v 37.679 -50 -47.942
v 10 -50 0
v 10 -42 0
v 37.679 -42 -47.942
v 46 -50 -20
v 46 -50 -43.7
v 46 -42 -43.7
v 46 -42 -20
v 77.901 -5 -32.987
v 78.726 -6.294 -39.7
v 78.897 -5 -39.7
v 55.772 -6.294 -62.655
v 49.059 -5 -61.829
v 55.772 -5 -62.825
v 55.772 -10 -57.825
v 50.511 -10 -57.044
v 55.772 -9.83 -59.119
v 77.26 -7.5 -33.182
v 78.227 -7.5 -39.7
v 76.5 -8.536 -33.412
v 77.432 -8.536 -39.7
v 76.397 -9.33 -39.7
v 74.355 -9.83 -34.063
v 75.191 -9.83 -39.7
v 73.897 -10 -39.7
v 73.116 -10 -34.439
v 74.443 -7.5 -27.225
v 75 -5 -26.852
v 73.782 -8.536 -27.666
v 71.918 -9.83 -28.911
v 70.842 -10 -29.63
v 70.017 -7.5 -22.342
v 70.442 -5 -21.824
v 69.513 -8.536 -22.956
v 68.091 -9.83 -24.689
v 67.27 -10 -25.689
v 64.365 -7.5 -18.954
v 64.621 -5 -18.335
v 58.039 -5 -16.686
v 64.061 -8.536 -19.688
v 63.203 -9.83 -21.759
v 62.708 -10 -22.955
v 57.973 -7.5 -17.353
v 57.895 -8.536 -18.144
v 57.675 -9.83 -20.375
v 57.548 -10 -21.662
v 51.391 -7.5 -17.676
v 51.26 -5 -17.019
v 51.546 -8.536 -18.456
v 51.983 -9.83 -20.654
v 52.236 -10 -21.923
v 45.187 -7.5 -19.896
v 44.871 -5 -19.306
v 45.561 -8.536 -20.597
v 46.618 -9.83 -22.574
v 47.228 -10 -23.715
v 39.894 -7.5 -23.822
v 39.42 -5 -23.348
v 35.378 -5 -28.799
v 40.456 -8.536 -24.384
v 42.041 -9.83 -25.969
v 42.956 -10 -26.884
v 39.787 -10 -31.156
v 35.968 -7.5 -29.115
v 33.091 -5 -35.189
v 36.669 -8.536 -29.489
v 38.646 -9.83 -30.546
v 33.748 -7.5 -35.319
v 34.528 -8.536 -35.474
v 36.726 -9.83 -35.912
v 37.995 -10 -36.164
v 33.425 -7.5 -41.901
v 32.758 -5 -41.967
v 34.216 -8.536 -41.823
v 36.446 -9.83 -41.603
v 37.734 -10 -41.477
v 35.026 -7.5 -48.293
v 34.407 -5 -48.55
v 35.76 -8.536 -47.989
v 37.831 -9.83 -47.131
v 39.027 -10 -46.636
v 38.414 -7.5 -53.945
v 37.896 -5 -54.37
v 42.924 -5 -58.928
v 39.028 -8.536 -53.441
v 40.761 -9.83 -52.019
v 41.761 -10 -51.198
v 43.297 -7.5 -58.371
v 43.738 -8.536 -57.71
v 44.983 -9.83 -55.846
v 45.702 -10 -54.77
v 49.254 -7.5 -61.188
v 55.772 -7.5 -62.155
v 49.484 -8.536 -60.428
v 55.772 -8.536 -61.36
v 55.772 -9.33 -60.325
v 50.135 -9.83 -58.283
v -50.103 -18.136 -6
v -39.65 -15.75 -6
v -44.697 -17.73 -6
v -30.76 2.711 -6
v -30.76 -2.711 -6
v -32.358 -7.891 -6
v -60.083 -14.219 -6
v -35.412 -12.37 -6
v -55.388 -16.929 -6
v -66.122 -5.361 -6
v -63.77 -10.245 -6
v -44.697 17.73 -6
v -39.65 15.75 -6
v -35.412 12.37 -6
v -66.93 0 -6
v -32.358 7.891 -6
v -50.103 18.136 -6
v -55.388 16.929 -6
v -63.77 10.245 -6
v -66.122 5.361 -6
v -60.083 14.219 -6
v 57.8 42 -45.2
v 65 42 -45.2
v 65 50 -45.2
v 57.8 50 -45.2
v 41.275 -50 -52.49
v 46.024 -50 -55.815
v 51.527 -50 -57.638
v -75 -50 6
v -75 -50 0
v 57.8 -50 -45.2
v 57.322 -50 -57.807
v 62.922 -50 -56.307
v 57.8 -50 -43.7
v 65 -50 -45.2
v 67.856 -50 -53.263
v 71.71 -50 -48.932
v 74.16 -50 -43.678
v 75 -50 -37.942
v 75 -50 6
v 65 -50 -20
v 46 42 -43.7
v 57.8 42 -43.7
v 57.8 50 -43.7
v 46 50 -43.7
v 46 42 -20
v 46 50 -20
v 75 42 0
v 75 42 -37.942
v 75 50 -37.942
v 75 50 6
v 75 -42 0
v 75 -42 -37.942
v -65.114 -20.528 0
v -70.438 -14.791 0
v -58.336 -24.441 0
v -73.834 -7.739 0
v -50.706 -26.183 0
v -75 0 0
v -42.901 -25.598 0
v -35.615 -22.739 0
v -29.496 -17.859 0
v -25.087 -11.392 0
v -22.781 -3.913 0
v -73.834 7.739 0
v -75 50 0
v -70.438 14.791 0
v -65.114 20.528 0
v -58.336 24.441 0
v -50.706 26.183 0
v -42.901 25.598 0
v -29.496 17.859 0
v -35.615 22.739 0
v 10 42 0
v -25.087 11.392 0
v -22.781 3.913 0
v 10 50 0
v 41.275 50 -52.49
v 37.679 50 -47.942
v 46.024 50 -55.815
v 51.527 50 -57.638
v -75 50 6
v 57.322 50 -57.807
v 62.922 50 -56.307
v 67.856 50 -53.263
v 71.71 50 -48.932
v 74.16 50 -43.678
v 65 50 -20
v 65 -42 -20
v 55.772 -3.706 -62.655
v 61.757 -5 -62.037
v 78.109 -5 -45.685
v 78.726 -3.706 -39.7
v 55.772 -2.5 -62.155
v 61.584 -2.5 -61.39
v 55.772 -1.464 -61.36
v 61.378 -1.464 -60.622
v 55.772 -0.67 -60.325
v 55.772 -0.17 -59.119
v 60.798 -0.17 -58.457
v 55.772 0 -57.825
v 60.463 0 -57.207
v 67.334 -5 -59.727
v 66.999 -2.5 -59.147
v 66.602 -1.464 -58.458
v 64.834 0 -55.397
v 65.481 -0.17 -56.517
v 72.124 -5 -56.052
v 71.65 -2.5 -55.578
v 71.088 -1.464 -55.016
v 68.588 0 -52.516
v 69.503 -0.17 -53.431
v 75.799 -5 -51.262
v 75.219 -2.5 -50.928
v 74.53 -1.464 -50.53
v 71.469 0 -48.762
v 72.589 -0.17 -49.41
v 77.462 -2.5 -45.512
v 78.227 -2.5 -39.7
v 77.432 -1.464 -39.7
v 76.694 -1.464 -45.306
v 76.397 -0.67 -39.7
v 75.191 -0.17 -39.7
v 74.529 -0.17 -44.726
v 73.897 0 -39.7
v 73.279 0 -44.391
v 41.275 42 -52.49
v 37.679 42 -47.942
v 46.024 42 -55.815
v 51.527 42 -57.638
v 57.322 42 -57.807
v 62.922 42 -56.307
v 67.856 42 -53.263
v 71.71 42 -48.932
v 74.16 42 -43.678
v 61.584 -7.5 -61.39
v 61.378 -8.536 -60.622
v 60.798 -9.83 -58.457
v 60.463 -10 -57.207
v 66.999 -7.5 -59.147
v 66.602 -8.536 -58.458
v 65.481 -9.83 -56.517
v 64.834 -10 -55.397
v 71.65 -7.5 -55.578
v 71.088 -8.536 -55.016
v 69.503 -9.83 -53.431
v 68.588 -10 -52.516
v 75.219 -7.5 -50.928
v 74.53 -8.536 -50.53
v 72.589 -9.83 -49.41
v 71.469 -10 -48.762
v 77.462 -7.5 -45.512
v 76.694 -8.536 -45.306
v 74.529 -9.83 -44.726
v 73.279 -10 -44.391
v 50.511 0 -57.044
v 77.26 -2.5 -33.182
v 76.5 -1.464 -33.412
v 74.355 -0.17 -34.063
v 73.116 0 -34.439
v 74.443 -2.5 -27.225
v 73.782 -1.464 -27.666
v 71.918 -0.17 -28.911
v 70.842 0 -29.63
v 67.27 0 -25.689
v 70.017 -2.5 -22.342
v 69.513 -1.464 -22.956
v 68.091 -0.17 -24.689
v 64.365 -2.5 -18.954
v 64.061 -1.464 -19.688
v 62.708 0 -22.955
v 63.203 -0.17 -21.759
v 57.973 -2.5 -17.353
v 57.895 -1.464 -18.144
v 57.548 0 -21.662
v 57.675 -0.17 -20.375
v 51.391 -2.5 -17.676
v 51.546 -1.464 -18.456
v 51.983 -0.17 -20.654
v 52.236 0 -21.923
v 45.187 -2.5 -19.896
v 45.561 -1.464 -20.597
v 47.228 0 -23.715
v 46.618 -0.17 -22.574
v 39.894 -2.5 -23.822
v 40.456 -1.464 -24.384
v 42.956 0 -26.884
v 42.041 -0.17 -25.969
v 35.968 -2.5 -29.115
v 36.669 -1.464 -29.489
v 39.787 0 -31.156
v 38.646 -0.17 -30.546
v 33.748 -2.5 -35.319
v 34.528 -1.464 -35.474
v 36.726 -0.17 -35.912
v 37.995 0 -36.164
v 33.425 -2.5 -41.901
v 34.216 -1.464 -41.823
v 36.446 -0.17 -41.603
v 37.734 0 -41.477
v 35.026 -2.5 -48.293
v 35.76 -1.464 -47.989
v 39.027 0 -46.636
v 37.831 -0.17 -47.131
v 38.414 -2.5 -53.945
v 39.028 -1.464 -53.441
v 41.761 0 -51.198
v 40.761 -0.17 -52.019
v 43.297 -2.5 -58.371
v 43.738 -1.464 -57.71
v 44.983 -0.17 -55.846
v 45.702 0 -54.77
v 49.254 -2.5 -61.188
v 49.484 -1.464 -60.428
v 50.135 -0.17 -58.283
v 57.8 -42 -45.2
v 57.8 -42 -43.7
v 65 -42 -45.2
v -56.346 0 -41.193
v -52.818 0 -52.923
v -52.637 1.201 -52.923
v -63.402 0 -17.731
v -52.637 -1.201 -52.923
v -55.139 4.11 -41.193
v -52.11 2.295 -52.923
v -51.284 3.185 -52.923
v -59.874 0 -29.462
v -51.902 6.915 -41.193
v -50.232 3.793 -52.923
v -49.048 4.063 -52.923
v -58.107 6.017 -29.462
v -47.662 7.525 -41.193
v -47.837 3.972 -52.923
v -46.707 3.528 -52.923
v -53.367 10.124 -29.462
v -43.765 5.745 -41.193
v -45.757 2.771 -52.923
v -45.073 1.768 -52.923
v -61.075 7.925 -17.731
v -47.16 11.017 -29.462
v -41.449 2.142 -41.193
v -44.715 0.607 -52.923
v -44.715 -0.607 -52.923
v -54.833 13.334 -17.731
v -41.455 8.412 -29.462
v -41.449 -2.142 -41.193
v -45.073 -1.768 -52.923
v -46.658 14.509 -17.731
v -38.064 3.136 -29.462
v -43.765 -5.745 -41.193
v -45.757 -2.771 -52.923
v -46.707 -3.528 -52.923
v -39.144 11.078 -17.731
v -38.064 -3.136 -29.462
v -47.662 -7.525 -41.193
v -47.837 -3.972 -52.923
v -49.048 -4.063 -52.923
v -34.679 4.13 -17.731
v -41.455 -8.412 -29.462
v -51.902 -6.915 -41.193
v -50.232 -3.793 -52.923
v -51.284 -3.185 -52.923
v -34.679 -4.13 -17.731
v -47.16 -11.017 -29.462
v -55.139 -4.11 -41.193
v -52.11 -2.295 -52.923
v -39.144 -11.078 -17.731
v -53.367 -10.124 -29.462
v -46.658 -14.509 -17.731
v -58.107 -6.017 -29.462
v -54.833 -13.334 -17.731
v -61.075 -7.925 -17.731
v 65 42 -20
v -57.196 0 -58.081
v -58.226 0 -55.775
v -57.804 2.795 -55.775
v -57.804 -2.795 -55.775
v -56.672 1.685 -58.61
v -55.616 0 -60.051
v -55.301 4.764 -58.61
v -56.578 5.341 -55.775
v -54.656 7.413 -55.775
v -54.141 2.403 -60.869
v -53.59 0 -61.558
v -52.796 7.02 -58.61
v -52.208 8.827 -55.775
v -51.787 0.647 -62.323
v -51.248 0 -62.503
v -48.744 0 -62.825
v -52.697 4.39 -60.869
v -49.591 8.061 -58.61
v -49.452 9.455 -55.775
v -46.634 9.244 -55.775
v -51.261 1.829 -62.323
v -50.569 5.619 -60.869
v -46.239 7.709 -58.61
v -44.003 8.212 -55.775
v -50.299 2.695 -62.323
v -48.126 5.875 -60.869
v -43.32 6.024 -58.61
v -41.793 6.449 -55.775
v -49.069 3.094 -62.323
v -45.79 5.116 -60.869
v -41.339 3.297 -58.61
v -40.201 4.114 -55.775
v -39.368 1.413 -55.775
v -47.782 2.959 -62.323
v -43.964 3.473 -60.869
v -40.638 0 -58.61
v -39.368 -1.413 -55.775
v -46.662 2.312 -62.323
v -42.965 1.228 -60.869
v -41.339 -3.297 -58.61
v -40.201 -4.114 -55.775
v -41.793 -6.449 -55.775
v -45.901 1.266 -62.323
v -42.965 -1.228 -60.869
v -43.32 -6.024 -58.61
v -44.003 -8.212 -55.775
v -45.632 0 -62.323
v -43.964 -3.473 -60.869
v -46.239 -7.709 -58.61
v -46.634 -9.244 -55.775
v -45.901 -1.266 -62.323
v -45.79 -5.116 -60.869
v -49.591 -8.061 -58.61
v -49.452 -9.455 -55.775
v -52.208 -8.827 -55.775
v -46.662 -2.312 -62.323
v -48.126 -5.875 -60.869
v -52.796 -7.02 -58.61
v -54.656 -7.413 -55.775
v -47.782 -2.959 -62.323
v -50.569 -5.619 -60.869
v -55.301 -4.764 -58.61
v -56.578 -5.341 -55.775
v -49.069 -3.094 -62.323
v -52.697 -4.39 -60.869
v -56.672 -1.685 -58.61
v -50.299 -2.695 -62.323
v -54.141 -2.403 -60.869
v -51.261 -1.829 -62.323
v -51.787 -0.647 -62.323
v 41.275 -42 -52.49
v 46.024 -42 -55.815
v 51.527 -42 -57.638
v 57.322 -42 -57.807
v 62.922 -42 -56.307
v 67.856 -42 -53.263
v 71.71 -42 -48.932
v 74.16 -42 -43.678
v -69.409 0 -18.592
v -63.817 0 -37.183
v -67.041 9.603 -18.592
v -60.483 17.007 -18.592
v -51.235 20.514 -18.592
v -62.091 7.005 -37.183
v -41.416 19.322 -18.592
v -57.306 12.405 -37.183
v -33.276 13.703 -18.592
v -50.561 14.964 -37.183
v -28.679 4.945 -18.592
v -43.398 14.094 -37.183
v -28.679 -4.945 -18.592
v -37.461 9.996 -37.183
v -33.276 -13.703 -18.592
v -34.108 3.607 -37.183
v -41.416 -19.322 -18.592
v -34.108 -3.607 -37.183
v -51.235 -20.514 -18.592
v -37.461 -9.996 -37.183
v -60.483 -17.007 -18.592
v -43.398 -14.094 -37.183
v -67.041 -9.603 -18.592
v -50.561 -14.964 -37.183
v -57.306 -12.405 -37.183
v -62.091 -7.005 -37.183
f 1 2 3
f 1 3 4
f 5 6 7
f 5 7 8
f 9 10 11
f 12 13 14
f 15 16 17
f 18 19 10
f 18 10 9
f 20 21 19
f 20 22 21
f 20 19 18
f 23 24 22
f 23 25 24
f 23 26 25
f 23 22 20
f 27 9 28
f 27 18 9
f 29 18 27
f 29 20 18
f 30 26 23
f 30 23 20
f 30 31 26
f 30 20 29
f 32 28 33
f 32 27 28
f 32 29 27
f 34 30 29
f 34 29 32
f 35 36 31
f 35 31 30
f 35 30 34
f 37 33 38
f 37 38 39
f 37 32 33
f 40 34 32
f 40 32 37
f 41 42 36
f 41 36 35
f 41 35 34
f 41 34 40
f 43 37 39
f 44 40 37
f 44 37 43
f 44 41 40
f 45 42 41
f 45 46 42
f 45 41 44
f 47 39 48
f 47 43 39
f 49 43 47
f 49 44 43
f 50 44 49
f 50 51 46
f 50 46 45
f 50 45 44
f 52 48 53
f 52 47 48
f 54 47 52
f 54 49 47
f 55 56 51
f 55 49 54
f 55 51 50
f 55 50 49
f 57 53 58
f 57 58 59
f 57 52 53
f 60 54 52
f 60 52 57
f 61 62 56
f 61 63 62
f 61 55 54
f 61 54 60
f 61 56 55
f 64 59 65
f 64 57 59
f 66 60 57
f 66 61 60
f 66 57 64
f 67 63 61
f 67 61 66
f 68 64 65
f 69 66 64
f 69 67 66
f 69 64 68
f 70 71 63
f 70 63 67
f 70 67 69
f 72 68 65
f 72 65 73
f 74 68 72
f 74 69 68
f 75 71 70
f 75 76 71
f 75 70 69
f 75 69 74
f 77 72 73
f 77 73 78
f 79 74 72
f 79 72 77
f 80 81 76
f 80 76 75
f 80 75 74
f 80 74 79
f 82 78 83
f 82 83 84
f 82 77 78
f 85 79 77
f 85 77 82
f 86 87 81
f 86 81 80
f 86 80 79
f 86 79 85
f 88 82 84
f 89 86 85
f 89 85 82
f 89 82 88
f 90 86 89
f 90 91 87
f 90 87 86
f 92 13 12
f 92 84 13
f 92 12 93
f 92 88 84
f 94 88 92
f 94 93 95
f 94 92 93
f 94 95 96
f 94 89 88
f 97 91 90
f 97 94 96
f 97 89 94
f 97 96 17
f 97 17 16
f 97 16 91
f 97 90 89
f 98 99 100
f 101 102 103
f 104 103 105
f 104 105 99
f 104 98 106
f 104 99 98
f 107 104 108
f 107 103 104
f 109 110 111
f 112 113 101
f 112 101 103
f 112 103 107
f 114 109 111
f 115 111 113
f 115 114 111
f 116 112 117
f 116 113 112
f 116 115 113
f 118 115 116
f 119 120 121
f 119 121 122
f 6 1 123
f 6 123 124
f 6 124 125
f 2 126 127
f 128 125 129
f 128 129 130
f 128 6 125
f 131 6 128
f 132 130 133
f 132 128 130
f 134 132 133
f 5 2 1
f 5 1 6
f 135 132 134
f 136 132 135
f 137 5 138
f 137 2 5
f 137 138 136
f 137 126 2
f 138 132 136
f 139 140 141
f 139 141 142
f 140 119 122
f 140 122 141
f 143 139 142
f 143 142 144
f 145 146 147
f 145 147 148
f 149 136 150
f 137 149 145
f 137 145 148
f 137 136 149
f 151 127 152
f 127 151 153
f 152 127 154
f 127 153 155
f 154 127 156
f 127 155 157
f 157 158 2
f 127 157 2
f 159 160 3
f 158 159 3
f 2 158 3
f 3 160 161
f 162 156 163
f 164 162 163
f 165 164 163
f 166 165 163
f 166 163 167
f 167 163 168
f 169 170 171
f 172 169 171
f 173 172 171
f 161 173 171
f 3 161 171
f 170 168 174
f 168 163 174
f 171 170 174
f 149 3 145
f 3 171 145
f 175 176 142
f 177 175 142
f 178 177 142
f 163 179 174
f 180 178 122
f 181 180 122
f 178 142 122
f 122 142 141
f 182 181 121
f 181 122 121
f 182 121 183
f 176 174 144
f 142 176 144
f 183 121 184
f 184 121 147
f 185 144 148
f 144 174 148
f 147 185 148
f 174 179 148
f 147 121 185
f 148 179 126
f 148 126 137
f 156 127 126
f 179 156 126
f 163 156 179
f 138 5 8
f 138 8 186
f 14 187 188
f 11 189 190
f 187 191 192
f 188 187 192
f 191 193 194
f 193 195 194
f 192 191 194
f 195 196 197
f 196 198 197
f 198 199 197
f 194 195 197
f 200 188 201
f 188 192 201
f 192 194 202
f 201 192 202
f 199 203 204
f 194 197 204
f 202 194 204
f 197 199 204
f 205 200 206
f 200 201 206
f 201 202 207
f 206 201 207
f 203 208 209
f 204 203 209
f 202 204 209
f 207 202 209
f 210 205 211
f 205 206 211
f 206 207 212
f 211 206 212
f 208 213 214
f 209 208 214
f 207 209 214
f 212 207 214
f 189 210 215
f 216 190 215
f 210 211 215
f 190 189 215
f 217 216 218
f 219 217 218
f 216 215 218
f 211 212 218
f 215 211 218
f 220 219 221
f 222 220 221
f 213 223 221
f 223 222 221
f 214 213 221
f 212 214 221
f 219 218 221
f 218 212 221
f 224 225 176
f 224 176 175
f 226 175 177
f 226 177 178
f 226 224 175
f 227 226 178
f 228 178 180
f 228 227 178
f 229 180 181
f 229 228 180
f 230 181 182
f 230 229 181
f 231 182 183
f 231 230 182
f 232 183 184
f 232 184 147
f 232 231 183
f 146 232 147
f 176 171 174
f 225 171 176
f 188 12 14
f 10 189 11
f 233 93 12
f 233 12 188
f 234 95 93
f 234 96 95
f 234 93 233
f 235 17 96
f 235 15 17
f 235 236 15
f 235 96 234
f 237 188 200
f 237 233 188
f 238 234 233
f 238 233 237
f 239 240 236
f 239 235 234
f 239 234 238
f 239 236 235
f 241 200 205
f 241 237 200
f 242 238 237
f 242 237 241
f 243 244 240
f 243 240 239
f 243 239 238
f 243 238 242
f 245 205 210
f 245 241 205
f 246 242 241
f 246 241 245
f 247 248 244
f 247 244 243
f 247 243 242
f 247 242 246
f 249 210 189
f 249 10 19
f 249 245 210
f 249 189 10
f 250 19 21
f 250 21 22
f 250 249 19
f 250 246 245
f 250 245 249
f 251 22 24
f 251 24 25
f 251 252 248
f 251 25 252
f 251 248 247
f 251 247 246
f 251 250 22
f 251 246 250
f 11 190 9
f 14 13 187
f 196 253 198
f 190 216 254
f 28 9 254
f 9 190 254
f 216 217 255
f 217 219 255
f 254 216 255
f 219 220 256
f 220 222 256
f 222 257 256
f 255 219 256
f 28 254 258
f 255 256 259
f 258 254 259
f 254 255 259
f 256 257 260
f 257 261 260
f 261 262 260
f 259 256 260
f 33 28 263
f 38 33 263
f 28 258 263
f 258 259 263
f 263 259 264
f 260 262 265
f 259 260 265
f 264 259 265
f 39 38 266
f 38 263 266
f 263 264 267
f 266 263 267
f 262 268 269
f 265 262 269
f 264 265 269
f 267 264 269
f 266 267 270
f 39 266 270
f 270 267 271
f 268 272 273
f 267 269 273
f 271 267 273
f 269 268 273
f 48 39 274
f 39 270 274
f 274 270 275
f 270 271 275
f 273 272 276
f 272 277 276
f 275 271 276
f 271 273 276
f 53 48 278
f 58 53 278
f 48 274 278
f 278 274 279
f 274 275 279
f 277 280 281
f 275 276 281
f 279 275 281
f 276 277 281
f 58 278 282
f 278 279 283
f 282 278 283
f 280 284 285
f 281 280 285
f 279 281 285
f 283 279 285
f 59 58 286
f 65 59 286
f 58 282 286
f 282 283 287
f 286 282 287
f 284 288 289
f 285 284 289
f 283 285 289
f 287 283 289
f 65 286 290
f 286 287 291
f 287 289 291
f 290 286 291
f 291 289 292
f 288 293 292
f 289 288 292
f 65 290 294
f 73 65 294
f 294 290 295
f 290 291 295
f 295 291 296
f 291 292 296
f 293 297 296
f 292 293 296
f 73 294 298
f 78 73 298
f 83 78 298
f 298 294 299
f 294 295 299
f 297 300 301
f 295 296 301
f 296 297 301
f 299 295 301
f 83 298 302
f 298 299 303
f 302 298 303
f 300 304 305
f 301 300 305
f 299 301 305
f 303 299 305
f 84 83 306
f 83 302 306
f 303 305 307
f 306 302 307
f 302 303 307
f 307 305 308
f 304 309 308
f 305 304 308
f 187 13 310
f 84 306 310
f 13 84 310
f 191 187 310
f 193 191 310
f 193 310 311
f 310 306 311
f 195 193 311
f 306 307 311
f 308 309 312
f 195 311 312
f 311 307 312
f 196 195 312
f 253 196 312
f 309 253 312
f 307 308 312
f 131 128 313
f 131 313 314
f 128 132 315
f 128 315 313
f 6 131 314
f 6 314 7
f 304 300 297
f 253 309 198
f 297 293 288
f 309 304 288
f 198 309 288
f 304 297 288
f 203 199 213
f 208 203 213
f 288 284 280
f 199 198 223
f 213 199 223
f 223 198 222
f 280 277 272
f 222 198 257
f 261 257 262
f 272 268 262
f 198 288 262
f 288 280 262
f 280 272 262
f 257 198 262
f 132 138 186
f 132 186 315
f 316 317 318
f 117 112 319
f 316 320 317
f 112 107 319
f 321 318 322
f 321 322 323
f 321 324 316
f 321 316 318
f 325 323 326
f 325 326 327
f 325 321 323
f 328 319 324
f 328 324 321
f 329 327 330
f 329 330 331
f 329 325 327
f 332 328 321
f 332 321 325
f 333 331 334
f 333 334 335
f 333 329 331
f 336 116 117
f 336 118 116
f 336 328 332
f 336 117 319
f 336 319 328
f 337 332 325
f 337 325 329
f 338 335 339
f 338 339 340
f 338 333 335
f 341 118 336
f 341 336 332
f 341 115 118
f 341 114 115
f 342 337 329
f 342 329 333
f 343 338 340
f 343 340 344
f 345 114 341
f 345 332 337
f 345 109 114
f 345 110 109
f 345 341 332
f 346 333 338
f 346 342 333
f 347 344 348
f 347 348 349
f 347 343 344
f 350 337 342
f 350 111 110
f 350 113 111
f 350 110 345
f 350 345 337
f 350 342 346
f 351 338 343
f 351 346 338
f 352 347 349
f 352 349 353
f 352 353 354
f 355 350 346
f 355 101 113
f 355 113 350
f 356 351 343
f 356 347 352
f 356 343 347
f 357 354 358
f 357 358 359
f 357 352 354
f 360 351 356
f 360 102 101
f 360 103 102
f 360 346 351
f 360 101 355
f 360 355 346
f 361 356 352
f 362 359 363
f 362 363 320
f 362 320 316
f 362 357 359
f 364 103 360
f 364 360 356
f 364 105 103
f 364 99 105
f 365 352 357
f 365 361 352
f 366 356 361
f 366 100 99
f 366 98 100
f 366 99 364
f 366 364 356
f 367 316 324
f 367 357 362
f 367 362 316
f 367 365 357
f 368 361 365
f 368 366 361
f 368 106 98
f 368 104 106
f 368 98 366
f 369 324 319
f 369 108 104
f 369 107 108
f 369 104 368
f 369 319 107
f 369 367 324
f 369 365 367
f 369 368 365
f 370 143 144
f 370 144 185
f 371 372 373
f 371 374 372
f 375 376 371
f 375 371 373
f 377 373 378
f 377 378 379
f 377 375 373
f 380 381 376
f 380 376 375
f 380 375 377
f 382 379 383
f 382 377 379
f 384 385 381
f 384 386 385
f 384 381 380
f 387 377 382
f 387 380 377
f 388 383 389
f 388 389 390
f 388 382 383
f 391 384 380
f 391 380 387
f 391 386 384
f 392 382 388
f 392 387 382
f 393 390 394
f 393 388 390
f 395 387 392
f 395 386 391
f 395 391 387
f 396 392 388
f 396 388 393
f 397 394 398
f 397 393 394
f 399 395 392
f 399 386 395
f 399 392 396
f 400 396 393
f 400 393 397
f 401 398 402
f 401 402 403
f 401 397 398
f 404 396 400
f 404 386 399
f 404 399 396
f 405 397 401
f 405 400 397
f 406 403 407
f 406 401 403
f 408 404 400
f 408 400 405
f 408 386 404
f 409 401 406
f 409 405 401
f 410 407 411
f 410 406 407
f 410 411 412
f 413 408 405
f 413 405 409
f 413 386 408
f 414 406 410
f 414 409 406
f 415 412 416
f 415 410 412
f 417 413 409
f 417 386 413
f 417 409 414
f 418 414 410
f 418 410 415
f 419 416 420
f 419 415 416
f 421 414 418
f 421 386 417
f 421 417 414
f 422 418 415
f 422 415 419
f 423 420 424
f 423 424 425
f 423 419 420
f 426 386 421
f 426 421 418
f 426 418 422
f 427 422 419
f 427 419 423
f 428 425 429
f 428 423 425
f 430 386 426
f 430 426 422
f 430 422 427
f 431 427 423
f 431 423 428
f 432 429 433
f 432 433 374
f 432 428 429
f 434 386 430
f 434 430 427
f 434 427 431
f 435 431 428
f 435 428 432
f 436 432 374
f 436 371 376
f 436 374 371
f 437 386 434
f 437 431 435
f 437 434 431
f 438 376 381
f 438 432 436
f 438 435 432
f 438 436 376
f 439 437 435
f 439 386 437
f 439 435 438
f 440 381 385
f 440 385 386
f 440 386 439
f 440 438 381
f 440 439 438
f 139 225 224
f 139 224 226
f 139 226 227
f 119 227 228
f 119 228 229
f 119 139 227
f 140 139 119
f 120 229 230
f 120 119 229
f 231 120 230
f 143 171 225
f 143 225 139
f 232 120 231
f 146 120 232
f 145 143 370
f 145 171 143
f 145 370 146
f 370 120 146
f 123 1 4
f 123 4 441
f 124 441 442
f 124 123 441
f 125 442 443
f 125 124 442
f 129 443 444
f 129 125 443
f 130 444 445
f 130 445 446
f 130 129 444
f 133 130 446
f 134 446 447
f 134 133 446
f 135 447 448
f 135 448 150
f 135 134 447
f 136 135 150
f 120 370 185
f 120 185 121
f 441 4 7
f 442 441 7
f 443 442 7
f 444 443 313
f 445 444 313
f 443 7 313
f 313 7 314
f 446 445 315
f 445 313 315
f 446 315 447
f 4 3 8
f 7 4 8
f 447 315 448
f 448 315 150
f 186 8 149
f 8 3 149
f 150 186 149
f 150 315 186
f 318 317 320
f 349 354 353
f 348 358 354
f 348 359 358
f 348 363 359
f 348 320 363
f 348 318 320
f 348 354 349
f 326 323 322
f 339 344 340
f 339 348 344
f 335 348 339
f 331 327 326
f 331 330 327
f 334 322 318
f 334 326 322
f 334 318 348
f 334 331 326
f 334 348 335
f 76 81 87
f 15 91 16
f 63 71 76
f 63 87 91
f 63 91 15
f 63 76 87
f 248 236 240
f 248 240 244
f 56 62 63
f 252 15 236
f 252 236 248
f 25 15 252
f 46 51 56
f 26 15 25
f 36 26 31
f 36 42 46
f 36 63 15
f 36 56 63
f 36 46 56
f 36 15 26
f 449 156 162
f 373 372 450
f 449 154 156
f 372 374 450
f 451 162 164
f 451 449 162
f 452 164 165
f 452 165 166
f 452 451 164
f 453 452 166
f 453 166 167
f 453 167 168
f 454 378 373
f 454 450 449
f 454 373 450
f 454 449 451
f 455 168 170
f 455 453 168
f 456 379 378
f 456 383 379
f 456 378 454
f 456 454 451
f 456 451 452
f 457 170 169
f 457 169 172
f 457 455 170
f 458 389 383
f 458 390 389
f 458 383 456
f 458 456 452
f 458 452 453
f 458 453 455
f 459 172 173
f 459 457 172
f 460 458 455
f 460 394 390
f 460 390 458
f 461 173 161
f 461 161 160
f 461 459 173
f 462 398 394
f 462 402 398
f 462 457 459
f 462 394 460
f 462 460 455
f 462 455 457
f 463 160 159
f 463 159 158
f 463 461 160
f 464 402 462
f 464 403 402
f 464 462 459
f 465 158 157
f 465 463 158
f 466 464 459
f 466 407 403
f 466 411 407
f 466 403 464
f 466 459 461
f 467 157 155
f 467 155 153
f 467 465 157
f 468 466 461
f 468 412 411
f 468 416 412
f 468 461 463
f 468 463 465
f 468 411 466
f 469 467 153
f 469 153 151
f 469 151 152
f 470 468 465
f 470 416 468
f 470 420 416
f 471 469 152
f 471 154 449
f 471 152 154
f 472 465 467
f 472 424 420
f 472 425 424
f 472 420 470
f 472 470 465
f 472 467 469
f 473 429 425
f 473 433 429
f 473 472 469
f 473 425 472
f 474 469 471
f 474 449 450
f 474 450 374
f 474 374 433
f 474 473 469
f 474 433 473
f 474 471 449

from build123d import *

# Parameters (mm, degrees)
F0_W     = 150
F0_H     = 100
F1_DEPTH = 6
F5_DEPTH = 100
F3_W     = 171.0709459866
F3_H     = 84
F6_DEPTH = 200
F8_DEPTH = 10
F9_R     = 4.99999


# Not quite as in the source:
# - a fillet or chamfer is up to 0.001 mm smaller than in the source, because OpenCascade refuses the exact size


with BuildPart() as f1:
    # F0 (on Top) → F1 (new body)
    with BuildSketch(Plane.XY):
        Rectangle(F0_W, F0_H)
    extrude(amount=F1_DEPTH)

    # F2 (on face) → F5 (join)
    with BuildSketch(Plane.XZ.offset(50)):
        with BuildLine():
            Line((75, 0), (10, 0))
            Line((10, 0), (37.6794919243, -47.9422863406))
            ThreePointArc((37.6794919243, -47.9422863406), (60.1763809021, -57.2608028664), (75, -37.9422863406))
            Line((75, -37.9422863406), (75, 0))
        make_face()
        Polygon((46, -20), (65, -20), (65, -45.2), (57.8, -45.2), (57.8, -43.7), (46, -43.7), align=None, mode=Mode.SUBTRACT)
    extrude(amount=-F5_DEPTH)

    # F3 (on Top) → F6 (cut)
    with BuildSketch(Plane.XY):
        with Locations((25.0738235191, 0)):
            Rectangle(F3_W, F3_H)
    extrude(amount=-F6_DEPTH, mode=Mode.SUBTRACT)

    # F4 (on Front) → F7 (revolve)
    with BuildSketch(Plane.XZ):
        with BuildLine():
            Line((-48.7436212599, 0), (-75, 0))
            Line((-75, 0), (-58.2256204143, -55.7750751688))
            ThreePointArc((-58.2256204143, -55.7750751688), (-58.2296045097, -50.0849254651), (-55.1008508317, -45.3321662722))
            Line((-55.1008508317, -45.3321662722), (-66.9300179817, -6))
            Line((-66.9300179817, -6), (-48.7436212599, -6))
            Line((-48.7436212599, -6), (-48.7436212599, 0))
        make_face()
        with BuildLine():
            ThreePointArc((-55.1008508317, -45.3321662722), (-58.2296045097, -50.0849254651), (-58.2256204143, -55.7750751688))
            ThreePointArc((-58.2256204143, -55.7750751688), (-54.6514212532, -60.8693328985), (-48.7436212599, -62.8249046049))
            Line((-48.7436212599, -62.8249046049), (-48.7436212599, -52.923359872))
            Line((-48.7436212599, -52.923359872), (-52.8177958548, -52.923359872))
            Line((-52.8177958548, -52.923359872), (-55.1008508317, -45.3321662722))
        make_face()
    revolve(axis=Axis((-48.7436212599, 0, -43.6514355242), (0, 0, -1)))


with BuildPart() as f8:
    # F4 (on Front) → F8 (new body)
    with BuildSketch(Plane.XZ):
        with BuildLine():
            ThreePointArc((78.8968328855, -39.7), (39.4201513826, -23.3482231771), (55.7719283868, -62.8249046049))
            ThreePointArc((55.7719283868, -62.8249046049), (72.1237051786, -56.0517768229), (78.8968328855, -39.7))
        make_face()
    extrude(amount=F8_DEPTH)

    # F9 (radius 5 in the source; OpenCascade refuses exactly that, so slightly less here)
    f9_edges = [f8.edges().sort_by_distance(p)[0] for p in [
        (55.771928, 0, -16.575095),
        (55.771928, -5, -62.824905),
        (55.771928, -10, -16.575095),
    ]]
    fillet(f9_edges, radius=F9_R)


solid = Compound([f1.part, f8.part])
